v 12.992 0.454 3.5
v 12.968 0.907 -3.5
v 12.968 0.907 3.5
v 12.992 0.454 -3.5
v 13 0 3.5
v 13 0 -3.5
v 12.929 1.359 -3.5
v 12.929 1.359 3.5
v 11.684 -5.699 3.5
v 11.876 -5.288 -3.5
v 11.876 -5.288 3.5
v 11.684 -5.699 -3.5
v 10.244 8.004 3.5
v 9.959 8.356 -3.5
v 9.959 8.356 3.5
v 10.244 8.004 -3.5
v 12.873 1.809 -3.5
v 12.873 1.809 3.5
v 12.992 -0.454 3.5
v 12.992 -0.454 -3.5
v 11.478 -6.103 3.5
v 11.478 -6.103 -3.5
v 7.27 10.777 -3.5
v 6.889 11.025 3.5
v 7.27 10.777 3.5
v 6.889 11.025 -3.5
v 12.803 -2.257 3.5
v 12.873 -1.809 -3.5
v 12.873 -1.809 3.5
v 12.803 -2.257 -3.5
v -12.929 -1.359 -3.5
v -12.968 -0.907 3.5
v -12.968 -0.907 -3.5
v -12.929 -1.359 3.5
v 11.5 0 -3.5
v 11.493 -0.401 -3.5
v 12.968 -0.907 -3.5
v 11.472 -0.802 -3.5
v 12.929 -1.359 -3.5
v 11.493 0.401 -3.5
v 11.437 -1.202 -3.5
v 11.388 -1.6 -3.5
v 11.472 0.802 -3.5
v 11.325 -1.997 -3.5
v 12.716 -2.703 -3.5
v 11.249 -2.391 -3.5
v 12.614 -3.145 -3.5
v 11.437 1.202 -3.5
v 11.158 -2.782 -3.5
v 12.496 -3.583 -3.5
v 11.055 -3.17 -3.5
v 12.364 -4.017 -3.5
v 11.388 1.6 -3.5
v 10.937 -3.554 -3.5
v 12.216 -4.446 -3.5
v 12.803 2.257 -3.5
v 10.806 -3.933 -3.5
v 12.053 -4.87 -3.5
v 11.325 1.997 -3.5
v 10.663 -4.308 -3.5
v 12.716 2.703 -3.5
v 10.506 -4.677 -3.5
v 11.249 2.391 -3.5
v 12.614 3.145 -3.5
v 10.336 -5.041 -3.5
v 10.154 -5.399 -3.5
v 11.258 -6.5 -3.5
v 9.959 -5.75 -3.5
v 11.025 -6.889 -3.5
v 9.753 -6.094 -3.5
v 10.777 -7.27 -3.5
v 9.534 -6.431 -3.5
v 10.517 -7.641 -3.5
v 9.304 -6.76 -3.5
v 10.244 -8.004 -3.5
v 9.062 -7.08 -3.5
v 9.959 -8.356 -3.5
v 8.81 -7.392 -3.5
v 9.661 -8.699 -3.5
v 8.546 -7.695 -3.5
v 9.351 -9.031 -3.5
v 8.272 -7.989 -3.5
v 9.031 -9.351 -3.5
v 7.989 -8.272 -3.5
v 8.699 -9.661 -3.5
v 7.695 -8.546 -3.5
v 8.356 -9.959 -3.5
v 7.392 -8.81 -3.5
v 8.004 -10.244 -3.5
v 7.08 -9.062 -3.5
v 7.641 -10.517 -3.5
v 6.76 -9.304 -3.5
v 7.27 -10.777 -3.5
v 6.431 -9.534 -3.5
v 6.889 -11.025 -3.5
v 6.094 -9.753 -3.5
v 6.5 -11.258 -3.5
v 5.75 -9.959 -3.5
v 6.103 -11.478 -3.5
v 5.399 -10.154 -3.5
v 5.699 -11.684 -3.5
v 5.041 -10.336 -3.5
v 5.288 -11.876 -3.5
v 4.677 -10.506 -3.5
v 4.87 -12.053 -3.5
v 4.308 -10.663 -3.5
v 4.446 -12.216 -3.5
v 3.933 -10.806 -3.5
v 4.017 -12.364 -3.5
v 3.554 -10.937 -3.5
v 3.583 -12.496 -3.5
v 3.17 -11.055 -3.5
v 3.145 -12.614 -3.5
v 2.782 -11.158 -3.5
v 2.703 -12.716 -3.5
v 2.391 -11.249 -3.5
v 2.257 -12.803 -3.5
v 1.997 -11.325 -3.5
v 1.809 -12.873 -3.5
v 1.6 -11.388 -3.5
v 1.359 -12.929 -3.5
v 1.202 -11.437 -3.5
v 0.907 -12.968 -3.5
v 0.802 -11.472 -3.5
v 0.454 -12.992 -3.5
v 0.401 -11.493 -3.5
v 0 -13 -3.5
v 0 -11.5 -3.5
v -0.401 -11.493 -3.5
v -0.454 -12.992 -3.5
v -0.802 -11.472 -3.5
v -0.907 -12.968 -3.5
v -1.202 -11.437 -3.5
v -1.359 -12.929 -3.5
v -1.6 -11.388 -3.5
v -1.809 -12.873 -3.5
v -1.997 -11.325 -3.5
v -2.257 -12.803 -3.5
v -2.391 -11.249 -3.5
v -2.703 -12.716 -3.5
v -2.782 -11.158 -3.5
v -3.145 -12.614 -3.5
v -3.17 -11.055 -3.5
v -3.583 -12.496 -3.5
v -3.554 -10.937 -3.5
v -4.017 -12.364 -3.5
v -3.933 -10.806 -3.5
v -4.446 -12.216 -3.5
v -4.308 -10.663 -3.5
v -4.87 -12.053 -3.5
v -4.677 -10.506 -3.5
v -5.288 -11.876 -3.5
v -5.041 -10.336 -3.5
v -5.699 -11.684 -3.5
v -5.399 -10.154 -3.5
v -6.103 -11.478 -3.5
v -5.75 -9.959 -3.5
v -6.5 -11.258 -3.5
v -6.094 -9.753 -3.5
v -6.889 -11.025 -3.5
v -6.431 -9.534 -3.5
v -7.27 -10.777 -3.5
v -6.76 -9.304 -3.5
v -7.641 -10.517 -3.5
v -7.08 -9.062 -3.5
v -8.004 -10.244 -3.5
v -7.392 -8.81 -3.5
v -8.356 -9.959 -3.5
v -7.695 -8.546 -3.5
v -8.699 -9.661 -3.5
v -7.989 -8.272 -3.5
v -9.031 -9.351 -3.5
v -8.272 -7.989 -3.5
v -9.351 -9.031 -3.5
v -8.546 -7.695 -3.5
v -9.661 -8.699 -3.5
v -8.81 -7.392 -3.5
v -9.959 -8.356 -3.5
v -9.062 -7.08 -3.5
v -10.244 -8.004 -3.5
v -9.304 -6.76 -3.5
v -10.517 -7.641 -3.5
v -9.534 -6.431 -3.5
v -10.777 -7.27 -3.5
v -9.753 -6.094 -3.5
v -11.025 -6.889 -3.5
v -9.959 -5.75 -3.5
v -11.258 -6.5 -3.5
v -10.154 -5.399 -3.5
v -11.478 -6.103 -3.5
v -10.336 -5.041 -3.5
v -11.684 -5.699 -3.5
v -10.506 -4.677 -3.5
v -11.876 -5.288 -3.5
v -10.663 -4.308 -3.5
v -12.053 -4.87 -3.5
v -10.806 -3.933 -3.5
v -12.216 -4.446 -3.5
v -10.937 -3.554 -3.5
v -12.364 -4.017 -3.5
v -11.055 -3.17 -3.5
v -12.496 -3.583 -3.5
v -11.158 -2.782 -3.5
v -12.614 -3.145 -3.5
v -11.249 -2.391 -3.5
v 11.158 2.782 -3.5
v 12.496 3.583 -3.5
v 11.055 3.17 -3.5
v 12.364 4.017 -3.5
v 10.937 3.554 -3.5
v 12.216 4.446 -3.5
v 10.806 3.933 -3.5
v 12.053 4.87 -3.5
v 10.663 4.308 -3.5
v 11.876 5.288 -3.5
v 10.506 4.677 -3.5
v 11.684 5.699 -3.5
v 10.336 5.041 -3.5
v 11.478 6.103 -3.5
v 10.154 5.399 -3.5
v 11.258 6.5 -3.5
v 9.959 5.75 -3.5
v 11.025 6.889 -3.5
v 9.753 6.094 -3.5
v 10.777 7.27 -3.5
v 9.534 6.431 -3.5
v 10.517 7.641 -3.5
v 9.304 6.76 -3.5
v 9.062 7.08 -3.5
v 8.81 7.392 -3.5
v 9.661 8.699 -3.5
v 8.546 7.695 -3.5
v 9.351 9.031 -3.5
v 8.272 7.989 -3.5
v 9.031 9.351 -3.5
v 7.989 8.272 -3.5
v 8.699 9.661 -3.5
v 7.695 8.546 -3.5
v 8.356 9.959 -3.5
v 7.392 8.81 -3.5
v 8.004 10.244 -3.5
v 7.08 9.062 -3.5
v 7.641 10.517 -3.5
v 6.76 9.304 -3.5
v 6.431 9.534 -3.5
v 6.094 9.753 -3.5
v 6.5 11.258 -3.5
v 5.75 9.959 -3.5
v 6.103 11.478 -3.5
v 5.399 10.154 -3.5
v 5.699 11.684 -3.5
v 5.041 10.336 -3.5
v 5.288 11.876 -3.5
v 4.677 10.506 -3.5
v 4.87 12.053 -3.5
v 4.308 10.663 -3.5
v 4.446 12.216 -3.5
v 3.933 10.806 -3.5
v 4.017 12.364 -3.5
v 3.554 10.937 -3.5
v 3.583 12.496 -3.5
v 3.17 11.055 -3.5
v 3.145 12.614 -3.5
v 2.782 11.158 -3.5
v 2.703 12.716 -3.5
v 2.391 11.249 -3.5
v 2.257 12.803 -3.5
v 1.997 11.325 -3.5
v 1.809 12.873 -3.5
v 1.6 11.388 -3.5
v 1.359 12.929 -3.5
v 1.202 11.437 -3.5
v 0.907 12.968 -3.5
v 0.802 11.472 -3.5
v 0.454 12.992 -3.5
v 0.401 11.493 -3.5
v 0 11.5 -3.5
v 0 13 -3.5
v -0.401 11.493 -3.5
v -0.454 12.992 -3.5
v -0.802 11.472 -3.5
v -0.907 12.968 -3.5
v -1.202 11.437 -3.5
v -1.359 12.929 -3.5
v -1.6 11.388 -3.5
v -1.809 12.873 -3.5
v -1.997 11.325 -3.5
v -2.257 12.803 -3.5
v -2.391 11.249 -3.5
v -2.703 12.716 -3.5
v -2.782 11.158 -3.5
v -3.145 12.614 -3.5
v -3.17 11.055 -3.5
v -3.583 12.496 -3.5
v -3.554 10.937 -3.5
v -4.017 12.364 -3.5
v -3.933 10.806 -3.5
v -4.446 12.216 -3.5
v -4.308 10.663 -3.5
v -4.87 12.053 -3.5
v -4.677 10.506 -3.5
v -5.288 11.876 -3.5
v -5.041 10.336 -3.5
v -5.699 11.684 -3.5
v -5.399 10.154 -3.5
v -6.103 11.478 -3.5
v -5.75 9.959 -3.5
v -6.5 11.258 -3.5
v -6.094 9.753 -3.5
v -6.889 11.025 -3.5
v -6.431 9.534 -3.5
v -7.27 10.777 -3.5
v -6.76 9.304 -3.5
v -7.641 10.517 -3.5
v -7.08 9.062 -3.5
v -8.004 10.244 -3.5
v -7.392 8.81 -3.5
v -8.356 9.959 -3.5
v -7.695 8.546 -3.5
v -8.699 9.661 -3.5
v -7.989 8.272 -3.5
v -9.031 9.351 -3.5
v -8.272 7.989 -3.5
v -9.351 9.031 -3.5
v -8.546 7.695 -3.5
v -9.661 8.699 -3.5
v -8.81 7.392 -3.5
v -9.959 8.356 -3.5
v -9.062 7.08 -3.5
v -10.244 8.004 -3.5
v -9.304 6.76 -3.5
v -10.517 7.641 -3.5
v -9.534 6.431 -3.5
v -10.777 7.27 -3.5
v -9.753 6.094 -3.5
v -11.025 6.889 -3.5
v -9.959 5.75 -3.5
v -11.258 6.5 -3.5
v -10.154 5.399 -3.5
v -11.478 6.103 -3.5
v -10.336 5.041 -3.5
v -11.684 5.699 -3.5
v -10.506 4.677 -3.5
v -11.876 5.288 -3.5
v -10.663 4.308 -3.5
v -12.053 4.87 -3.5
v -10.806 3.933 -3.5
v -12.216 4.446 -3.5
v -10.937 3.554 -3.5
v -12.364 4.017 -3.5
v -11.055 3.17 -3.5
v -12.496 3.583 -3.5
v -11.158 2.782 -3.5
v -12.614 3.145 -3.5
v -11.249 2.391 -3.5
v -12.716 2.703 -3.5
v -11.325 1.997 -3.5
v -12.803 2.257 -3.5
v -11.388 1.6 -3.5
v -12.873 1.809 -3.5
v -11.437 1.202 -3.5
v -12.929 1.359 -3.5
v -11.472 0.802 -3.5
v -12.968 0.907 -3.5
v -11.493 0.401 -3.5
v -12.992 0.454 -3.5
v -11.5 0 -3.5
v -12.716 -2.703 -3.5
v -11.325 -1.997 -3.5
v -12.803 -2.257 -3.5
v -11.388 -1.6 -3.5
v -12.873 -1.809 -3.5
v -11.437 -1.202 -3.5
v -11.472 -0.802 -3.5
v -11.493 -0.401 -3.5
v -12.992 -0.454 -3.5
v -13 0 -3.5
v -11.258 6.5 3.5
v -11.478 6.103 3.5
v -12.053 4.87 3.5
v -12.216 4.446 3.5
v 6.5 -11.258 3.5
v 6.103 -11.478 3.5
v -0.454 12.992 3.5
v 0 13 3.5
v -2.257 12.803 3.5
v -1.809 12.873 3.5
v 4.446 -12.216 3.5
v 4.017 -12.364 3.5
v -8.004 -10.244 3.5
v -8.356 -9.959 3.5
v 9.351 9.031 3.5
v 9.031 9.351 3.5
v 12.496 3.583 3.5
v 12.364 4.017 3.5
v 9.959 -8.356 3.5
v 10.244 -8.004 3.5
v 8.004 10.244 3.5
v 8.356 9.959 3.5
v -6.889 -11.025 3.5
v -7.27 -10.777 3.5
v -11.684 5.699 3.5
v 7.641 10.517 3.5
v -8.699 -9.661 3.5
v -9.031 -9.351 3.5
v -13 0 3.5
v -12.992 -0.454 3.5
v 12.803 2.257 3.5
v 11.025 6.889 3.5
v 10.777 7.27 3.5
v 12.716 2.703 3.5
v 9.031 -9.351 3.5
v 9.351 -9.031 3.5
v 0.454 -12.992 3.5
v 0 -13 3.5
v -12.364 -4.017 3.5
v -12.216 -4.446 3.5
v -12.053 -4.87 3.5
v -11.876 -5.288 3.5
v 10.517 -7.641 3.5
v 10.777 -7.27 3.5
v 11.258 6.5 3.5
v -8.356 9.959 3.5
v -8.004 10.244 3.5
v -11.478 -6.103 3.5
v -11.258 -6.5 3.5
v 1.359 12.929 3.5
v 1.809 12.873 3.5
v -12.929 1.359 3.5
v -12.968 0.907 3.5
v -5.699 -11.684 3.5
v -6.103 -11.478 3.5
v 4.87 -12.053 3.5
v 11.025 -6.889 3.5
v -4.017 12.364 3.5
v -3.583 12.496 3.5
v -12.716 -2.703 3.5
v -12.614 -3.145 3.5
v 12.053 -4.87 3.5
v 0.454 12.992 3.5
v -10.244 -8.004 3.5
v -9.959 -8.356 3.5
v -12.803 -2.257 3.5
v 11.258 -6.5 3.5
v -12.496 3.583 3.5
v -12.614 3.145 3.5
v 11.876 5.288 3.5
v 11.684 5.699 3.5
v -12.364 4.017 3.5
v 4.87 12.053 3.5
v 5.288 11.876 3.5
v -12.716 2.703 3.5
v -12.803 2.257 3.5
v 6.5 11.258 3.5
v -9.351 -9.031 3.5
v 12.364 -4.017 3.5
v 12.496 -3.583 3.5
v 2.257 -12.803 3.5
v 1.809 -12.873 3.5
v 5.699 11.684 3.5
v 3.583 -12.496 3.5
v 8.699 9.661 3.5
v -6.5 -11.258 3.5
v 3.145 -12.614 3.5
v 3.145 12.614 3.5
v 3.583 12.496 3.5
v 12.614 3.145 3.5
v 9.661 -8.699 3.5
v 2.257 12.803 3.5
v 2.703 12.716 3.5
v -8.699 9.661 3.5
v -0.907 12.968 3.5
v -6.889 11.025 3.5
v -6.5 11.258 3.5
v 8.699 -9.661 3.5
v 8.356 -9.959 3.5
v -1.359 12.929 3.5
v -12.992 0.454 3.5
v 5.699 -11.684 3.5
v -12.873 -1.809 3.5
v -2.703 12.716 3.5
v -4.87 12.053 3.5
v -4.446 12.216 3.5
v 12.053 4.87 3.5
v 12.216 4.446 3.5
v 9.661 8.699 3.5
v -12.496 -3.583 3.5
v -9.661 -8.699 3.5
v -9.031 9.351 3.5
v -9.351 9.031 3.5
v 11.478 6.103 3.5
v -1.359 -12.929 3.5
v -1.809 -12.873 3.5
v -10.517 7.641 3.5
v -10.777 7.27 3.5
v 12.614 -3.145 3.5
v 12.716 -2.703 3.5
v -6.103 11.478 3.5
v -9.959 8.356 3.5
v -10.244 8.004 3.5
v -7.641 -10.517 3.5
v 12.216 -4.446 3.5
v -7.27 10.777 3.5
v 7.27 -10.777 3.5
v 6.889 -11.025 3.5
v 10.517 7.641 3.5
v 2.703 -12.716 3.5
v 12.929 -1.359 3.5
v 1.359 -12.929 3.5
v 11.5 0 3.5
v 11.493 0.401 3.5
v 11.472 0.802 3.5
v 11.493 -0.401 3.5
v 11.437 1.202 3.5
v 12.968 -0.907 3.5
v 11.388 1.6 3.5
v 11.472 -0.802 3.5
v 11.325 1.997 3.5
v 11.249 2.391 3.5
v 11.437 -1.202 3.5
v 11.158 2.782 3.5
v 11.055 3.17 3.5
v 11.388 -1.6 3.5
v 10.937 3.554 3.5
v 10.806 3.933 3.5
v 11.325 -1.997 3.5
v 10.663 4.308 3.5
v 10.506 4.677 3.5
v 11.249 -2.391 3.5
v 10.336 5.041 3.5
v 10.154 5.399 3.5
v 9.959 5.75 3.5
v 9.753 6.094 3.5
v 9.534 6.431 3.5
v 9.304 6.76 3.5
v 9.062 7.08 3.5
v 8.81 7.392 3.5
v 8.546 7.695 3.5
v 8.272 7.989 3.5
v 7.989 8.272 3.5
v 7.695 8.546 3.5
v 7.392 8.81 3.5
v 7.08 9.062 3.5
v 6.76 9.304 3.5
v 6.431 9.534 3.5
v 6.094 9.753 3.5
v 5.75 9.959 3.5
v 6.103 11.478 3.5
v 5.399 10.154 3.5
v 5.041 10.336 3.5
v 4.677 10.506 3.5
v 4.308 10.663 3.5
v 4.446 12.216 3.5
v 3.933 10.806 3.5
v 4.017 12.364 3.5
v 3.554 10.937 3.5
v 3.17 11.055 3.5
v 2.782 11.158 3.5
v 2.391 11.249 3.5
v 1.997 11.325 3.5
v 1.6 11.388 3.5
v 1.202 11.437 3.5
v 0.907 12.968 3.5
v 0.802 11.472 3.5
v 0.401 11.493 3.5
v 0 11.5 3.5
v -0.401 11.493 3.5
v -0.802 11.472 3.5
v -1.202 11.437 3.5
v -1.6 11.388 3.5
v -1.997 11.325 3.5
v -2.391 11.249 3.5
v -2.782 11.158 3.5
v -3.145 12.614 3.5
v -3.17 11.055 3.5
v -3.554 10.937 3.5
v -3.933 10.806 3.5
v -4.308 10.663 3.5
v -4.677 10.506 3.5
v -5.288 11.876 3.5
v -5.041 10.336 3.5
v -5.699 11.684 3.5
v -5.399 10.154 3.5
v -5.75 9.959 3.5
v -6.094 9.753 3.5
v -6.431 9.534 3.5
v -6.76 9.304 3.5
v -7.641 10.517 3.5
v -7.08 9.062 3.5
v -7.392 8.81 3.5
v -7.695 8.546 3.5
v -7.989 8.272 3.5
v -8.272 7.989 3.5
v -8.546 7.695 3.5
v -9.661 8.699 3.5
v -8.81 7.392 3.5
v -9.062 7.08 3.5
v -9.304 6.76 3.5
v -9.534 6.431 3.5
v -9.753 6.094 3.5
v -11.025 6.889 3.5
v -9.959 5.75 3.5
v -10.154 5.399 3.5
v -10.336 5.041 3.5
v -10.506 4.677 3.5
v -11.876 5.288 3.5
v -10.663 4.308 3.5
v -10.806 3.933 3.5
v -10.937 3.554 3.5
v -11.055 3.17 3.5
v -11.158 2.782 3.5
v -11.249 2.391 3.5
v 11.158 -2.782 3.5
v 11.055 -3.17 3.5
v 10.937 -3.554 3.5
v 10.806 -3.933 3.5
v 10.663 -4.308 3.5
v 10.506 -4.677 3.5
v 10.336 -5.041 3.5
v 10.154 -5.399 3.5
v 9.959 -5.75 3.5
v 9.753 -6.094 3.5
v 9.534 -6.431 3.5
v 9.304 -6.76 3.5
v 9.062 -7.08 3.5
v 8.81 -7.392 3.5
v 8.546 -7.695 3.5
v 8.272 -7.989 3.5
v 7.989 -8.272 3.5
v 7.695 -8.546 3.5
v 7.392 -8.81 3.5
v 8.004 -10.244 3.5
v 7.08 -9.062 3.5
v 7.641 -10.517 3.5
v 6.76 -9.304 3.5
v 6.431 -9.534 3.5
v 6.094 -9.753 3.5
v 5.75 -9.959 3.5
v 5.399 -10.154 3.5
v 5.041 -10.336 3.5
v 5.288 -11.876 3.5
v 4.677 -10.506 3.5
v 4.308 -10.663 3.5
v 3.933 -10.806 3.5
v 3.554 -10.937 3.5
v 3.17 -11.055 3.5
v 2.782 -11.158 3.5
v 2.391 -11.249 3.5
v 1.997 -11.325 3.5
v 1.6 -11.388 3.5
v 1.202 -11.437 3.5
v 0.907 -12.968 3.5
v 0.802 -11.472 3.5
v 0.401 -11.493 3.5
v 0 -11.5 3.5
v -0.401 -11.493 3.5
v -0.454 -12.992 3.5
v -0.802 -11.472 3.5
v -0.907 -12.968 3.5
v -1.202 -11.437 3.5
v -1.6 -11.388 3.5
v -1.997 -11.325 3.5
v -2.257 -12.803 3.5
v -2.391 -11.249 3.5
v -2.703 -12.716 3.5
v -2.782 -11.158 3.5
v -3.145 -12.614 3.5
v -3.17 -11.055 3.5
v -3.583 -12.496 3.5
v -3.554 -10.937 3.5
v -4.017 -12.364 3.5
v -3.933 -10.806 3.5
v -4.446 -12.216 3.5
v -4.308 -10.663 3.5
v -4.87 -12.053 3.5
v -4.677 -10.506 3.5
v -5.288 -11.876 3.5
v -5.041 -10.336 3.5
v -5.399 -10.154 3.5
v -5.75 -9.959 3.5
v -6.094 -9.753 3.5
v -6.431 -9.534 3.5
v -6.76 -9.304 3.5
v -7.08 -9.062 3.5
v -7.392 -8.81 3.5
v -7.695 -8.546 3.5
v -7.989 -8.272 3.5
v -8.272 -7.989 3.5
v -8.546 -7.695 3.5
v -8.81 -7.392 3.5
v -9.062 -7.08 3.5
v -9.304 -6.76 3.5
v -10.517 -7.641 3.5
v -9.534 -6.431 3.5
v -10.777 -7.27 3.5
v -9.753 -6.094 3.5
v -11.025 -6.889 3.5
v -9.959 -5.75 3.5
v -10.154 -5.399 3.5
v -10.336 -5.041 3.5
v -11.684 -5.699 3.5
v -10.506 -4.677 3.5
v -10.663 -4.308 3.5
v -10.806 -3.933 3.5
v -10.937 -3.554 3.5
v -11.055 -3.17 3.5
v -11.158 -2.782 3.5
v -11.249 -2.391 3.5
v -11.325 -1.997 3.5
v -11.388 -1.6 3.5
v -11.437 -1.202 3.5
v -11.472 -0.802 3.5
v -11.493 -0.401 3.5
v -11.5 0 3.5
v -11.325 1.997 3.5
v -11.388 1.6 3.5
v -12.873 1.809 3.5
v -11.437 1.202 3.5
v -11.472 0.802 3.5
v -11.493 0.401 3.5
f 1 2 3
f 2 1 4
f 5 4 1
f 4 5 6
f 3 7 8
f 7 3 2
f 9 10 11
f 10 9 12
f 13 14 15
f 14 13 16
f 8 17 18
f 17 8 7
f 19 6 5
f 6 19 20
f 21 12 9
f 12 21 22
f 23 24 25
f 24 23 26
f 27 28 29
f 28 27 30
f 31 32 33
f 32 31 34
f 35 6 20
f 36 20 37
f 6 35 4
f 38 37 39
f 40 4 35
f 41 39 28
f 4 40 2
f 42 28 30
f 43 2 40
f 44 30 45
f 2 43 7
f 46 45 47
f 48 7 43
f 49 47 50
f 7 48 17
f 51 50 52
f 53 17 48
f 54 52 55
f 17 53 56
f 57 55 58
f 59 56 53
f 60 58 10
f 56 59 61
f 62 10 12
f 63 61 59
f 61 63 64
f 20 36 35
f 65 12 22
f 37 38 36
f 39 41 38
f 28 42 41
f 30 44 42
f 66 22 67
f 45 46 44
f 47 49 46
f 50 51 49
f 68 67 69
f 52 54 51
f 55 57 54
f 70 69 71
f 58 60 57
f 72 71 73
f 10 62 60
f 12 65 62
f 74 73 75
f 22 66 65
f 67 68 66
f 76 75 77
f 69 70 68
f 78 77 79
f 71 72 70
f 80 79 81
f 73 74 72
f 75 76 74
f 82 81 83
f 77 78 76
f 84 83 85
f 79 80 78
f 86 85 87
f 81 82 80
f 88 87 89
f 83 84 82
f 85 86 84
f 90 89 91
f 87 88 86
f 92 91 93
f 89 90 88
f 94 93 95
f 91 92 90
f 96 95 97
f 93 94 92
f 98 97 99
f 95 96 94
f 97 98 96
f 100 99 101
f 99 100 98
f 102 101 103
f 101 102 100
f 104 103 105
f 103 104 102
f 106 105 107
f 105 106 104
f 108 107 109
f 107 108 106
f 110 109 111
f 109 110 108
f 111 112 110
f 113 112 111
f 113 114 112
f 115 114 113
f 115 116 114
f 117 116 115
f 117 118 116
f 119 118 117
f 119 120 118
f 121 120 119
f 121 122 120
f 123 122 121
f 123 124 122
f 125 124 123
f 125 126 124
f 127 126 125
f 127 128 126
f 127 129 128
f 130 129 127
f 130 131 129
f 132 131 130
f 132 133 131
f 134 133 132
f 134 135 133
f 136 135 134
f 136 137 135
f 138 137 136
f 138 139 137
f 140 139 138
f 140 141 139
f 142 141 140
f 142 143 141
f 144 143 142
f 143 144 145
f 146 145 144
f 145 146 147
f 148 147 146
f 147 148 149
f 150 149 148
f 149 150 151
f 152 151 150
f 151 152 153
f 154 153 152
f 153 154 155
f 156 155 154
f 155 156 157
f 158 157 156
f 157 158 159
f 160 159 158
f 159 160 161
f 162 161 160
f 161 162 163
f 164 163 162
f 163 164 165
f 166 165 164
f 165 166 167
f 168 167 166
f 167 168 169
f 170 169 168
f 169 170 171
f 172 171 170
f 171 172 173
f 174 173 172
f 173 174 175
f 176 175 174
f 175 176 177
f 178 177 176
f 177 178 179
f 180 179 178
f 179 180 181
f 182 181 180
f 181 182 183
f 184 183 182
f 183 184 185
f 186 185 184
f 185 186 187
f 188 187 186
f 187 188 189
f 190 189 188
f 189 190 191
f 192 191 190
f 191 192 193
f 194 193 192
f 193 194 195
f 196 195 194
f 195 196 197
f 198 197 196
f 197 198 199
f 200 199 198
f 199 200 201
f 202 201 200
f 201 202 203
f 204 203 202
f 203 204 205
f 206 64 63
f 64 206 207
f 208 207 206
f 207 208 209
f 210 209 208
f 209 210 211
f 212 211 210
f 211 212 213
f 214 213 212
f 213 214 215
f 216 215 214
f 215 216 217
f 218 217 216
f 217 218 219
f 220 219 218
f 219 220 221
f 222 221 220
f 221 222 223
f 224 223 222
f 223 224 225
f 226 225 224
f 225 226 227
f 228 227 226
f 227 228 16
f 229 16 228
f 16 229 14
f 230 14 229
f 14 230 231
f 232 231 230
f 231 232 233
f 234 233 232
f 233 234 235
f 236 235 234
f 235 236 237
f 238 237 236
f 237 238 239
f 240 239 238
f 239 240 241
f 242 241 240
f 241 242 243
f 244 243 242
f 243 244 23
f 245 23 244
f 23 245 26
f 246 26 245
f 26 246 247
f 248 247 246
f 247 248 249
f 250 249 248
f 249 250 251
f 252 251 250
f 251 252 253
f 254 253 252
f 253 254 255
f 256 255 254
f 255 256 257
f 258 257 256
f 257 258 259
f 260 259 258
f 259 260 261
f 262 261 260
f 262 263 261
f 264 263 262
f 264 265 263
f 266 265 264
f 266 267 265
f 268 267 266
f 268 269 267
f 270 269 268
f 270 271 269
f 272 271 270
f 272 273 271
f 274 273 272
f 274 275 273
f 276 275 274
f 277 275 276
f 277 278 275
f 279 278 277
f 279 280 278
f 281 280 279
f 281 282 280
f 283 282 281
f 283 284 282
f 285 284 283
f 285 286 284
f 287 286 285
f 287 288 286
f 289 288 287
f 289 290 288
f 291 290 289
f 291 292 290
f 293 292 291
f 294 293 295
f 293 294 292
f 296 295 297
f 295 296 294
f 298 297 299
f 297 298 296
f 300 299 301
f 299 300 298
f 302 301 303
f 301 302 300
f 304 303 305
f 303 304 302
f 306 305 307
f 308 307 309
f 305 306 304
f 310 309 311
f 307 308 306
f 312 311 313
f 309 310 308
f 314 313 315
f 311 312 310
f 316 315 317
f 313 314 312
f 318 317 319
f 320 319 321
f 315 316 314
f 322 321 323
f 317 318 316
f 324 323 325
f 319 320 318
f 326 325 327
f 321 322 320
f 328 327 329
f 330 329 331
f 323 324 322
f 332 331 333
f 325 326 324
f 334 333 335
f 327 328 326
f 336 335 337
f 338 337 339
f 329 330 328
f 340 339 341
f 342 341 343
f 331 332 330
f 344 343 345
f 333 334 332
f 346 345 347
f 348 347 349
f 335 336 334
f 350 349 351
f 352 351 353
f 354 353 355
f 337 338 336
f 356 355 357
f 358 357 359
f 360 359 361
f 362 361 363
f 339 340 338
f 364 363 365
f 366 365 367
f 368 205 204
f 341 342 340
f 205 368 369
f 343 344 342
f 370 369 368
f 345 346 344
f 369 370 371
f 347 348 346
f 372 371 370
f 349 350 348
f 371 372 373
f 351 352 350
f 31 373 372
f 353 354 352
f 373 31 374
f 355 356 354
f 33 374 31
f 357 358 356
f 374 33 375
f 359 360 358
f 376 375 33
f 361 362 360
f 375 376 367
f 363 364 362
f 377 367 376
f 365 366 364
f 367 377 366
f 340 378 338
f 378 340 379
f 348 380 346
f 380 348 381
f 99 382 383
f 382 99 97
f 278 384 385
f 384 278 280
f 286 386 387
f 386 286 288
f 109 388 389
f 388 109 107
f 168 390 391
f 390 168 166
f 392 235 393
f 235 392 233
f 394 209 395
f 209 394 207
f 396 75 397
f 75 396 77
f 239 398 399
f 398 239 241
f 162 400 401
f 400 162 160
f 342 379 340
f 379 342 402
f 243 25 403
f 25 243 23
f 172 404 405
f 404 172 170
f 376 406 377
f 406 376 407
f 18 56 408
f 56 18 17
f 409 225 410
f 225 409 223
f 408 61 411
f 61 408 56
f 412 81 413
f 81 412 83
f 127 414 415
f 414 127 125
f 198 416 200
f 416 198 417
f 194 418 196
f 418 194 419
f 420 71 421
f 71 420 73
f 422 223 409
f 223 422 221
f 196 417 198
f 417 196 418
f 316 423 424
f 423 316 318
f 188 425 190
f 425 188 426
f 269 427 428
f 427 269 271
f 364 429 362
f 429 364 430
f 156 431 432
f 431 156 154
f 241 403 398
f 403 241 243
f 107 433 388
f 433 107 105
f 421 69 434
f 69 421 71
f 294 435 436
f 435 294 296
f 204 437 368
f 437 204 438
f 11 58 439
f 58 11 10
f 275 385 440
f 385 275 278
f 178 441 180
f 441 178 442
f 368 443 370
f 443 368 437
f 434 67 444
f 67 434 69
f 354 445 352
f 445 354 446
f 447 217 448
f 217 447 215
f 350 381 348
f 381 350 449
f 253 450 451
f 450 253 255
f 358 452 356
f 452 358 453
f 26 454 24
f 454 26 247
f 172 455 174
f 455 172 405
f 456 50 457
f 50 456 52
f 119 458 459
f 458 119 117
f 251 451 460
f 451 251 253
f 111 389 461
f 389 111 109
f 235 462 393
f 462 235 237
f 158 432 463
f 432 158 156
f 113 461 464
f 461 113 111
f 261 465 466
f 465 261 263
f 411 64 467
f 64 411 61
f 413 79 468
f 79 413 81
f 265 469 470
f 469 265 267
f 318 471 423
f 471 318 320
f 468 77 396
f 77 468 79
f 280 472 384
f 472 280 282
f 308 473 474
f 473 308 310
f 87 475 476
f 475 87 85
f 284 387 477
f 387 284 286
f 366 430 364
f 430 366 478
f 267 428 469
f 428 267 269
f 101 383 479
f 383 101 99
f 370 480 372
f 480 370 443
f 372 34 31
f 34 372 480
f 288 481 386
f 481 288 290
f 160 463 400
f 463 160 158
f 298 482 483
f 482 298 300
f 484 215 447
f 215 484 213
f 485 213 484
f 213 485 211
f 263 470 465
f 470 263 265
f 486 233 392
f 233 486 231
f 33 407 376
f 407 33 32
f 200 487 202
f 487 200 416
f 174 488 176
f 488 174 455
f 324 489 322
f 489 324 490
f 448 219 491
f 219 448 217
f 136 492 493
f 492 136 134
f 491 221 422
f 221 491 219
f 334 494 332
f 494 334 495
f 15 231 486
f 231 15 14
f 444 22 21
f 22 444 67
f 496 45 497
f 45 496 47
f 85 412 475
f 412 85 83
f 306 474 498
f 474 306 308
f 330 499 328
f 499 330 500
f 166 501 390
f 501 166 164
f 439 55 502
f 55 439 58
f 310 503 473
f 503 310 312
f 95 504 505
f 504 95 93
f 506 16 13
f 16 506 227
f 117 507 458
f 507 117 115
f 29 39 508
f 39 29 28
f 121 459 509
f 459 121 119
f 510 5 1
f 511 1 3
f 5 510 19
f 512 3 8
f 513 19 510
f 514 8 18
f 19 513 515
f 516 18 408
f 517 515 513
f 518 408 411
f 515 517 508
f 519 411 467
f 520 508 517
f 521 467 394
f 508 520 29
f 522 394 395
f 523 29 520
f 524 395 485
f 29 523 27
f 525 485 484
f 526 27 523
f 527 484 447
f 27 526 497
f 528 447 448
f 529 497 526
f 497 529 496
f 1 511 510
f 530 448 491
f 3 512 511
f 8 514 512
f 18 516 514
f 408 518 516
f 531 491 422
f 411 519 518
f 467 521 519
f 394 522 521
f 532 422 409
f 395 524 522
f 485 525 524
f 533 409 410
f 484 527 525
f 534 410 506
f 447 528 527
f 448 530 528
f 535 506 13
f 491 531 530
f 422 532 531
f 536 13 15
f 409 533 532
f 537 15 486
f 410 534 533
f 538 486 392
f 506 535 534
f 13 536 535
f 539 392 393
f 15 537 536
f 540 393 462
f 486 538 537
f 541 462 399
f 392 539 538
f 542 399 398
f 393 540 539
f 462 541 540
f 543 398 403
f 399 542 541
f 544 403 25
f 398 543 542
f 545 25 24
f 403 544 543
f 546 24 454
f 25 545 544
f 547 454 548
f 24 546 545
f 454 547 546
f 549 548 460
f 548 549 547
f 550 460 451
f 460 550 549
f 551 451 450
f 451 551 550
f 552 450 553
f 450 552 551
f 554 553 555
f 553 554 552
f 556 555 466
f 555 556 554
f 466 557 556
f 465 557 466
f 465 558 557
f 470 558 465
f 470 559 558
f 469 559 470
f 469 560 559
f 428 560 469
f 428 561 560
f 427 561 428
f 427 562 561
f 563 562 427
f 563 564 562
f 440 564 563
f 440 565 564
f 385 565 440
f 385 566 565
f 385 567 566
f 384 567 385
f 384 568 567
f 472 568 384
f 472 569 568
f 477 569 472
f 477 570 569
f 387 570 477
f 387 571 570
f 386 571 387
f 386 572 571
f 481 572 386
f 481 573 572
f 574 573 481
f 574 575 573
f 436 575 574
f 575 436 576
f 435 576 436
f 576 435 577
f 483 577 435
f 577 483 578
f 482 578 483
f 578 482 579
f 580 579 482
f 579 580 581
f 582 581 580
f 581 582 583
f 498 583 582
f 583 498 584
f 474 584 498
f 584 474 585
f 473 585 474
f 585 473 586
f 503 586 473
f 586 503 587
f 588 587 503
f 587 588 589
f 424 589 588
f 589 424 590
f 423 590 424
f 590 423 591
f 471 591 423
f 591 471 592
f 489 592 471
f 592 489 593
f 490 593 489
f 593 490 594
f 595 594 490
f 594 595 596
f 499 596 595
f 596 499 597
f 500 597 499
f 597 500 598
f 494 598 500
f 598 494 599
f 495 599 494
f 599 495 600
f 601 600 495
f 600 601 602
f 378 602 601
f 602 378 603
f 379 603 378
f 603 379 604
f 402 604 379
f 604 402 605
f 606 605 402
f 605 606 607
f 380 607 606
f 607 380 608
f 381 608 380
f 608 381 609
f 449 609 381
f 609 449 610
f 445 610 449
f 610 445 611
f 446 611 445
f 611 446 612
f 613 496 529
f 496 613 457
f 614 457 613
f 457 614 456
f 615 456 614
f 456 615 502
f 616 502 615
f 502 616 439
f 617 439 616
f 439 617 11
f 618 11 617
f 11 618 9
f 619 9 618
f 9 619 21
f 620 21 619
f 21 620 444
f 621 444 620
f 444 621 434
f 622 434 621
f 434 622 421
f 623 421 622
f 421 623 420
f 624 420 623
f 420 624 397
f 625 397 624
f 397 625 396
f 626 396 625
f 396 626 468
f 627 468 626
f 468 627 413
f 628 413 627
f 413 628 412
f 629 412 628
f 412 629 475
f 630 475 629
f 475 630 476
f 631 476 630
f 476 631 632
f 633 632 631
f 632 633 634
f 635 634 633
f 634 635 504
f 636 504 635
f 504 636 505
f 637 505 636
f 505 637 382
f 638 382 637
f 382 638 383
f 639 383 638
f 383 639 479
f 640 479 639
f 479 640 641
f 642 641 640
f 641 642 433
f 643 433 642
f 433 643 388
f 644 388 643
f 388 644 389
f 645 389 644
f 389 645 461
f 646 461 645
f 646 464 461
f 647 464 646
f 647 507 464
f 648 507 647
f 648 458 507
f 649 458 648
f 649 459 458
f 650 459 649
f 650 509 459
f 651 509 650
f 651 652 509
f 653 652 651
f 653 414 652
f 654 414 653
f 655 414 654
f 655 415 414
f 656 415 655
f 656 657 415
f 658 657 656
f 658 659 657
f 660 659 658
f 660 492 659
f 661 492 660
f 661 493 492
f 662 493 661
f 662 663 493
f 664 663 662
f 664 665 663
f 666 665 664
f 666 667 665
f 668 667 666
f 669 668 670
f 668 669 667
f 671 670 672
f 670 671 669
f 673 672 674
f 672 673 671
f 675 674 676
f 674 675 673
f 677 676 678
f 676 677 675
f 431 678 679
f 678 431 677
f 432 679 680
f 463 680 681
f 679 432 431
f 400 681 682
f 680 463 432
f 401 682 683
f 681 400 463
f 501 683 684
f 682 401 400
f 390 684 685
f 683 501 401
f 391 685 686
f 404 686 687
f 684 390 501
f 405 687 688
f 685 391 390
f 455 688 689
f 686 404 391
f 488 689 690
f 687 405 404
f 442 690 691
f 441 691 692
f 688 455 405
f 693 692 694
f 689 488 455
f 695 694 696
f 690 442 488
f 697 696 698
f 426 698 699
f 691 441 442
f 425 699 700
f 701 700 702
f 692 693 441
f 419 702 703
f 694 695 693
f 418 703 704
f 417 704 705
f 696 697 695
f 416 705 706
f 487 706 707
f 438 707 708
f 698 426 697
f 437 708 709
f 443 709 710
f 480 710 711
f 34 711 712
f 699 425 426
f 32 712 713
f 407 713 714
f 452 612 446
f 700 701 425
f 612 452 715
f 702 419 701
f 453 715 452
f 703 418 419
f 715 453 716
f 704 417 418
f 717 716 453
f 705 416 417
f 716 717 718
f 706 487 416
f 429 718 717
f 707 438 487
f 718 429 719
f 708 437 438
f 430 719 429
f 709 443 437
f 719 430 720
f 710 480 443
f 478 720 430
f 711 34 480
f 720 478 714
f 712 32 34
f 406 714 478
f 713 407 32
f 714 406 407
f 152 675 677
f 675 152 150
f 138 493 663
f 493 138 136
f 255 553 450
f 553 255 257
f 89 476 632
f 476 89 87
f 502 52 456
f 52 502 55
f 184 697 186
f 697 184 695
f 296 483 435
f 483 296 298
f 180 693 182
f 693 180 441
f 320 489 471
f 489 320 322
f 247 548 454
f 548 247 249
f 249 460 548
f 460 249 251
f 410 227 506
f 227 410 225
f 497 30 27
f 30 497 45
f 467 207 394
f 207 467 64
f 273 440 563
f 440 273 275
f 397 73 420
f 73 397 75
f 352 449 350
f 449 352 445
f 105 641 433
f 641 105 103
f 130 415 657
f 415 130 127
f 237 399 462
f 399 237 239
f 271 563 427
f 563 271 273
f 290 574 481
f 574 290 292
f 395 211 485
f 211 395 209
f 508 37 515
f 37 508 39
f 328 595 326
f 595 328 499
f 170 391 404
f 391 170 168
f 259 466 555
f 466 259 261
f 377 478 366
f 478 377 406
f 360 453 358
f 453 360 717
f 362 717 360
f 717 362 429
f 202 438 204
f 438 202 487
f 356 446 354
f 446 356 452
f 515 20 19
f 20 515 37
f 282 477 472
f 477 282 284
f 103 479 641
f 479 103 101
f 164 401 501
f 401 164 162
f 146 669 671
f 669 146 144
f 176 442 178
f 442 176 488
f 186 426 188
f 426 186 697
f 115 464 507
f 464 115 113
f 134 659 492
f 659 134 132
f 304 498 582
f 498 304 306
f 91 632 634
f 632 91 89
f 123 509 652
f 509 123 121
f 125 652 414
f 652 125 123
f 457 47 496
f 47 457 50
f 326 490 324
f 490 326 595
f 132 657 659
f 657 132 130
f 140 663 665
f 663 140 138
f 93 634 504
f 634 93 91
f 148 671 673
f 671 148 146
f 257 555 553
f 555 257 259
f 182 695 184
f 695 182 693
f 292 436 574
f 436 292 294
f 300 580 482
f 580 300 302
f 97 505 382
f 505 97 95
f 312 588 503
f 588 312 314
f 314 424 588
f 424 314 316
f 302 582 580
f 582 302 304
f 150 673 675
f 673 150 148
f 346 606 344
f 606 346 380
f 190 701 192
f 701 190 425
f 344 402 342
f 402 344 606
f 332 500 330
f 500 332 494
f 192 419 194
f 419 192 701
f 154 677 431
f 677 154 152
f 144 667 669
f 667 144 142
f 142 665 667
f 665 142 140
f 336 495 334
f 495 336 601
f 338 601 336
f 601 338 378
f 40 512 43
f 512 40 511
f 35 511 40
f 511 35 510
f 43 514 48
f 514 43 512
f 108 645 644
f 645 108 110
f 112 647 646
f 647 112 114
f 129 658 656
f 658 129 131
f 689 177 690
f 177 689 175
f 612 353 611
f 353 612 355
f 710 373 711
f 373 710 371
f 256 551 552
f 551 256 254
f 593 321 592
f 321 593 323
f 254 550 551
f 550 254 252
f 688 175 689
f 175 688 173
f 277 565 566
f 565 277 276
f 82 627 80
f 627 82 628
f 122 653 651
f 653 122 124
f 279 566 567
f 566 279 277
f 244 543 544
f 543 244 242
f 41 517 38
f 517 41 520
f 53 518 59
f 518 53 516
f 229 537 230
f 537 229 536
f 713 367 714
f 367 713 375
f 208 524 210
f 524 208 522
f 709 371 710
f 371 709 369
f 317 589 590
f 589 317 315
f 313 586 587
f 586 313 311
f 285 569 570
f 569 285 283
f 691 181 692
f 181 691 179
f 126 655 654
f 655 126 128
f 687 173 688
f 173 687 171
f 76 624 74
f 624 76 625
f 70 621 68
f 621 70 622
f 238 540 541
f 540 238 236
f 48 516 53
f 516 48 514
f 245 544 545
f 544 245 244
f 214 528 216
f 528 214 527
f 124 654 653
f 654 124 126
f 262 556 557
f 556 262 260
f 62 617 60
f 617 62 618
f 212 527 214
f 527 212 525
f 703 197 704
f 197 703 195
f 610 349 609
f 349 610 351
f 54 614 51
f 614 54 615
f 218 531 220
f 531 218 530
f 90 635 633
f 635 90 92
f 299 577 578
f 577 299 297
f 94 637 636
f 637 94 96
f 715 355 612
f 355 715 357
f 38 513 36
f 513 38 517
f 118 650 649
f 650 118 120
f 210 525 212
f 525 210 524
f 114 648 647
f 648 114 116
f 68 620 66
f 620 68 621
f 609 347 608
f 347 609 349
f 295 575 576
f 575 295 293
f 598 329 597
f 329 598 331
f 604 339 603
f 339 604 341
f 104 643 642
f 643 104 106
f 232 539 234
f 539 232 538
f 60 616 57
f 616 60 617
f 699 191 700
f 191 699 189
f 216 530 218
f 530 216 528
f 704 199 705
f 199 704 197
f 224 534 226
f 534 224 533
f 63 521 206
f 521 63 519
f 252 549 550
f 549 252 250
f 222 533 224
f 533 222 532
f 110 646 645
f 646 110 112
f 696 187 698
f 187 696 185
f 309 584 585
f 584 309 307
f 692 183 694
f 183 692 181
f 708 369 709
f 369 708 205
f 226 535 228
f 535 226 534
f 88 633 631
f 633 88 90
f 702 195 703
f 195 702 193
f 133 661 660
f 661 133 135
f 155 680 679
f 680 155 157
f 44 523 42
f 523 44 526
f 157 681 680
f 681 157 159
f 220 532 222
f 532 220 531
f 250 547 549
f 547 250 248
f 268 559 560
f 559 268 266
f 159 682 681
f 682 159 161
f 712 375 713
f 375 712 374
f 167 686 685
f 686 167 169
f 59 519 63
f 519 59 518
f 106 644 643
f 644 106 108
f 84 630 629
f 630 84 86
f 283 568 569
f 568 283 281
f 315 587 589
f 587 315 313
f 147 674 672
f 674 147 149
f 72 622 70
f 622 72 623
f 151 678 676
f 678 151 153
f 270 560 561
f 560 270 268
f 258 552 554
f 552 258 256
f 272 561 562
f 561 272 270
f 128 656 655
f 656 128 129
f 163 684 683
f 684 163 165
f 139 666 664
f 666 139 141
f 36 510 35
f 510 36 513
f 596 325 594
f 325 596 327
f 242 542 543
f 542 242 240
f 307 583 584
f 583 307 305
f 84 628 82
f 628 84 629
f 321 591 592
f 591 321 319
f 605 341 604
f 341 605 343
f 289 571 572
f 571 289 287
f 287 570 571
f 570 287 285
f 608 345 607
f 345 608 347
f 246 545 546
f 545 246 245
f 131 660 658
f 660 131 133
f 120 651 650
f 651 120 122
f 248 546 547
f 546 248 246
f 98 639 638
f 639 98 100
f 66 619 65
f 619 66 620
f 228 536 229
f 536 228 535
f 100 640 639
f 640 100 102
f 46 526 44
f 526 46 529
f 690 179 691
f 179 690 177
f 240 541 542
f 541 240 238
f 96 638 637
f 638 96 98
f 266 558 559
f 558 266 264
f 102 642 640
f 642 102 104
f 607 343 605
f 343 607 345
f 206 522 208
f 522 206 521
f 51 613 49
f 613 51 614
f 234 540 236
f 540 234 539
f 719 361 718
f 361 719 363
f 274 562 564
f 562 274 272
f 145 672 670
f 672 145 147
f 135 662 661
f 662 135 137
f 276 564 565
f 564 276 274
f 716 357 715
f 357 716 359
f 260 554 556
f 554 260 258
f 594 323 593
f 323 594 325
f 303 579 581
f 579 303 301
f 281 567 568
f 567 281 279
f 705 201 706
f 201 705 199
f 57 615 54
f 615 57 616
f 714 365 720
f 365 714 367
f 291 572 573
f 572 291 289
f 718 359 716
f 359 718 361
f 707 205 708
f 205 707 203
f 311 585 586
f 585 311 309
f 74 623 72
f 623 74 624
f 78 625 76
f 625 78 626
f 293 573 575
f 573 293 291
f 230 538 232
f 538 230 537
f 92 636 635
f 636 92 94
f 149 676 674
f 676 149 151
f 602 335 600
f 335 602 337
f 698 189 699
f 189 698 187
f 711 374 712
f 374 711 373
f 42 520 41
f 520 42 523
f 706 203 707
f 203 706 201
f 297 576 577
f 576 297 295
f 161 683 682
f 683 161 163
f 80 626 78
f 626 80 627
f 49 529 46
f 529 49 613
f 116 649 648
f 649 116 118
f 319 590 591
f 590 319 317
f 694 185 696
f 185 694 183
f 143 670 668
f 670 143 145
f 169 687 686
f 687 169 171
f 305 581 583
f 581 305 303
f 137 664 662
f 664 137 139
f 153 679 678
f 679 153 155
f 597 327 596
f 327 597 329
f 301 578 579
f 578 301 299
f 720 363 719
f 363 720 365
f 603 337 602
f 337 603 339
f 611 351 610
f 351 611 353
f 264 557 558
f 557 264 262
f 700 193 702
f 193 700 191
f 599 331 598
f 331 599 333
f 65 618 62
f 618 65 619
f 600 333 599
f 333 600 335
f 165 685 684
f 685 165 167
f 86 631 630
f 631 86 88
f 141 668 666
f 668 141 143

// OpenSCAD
$fa = 2;
$fs = 0.4;

module motor_magnet_ring() {
  color("#2a2a30")
    difference() {
      cylinder(h = 7, d = 26, center = true);
      cylinder(h = 8, d = 23, center = true);
    }
}

motor_magnet_ring();
